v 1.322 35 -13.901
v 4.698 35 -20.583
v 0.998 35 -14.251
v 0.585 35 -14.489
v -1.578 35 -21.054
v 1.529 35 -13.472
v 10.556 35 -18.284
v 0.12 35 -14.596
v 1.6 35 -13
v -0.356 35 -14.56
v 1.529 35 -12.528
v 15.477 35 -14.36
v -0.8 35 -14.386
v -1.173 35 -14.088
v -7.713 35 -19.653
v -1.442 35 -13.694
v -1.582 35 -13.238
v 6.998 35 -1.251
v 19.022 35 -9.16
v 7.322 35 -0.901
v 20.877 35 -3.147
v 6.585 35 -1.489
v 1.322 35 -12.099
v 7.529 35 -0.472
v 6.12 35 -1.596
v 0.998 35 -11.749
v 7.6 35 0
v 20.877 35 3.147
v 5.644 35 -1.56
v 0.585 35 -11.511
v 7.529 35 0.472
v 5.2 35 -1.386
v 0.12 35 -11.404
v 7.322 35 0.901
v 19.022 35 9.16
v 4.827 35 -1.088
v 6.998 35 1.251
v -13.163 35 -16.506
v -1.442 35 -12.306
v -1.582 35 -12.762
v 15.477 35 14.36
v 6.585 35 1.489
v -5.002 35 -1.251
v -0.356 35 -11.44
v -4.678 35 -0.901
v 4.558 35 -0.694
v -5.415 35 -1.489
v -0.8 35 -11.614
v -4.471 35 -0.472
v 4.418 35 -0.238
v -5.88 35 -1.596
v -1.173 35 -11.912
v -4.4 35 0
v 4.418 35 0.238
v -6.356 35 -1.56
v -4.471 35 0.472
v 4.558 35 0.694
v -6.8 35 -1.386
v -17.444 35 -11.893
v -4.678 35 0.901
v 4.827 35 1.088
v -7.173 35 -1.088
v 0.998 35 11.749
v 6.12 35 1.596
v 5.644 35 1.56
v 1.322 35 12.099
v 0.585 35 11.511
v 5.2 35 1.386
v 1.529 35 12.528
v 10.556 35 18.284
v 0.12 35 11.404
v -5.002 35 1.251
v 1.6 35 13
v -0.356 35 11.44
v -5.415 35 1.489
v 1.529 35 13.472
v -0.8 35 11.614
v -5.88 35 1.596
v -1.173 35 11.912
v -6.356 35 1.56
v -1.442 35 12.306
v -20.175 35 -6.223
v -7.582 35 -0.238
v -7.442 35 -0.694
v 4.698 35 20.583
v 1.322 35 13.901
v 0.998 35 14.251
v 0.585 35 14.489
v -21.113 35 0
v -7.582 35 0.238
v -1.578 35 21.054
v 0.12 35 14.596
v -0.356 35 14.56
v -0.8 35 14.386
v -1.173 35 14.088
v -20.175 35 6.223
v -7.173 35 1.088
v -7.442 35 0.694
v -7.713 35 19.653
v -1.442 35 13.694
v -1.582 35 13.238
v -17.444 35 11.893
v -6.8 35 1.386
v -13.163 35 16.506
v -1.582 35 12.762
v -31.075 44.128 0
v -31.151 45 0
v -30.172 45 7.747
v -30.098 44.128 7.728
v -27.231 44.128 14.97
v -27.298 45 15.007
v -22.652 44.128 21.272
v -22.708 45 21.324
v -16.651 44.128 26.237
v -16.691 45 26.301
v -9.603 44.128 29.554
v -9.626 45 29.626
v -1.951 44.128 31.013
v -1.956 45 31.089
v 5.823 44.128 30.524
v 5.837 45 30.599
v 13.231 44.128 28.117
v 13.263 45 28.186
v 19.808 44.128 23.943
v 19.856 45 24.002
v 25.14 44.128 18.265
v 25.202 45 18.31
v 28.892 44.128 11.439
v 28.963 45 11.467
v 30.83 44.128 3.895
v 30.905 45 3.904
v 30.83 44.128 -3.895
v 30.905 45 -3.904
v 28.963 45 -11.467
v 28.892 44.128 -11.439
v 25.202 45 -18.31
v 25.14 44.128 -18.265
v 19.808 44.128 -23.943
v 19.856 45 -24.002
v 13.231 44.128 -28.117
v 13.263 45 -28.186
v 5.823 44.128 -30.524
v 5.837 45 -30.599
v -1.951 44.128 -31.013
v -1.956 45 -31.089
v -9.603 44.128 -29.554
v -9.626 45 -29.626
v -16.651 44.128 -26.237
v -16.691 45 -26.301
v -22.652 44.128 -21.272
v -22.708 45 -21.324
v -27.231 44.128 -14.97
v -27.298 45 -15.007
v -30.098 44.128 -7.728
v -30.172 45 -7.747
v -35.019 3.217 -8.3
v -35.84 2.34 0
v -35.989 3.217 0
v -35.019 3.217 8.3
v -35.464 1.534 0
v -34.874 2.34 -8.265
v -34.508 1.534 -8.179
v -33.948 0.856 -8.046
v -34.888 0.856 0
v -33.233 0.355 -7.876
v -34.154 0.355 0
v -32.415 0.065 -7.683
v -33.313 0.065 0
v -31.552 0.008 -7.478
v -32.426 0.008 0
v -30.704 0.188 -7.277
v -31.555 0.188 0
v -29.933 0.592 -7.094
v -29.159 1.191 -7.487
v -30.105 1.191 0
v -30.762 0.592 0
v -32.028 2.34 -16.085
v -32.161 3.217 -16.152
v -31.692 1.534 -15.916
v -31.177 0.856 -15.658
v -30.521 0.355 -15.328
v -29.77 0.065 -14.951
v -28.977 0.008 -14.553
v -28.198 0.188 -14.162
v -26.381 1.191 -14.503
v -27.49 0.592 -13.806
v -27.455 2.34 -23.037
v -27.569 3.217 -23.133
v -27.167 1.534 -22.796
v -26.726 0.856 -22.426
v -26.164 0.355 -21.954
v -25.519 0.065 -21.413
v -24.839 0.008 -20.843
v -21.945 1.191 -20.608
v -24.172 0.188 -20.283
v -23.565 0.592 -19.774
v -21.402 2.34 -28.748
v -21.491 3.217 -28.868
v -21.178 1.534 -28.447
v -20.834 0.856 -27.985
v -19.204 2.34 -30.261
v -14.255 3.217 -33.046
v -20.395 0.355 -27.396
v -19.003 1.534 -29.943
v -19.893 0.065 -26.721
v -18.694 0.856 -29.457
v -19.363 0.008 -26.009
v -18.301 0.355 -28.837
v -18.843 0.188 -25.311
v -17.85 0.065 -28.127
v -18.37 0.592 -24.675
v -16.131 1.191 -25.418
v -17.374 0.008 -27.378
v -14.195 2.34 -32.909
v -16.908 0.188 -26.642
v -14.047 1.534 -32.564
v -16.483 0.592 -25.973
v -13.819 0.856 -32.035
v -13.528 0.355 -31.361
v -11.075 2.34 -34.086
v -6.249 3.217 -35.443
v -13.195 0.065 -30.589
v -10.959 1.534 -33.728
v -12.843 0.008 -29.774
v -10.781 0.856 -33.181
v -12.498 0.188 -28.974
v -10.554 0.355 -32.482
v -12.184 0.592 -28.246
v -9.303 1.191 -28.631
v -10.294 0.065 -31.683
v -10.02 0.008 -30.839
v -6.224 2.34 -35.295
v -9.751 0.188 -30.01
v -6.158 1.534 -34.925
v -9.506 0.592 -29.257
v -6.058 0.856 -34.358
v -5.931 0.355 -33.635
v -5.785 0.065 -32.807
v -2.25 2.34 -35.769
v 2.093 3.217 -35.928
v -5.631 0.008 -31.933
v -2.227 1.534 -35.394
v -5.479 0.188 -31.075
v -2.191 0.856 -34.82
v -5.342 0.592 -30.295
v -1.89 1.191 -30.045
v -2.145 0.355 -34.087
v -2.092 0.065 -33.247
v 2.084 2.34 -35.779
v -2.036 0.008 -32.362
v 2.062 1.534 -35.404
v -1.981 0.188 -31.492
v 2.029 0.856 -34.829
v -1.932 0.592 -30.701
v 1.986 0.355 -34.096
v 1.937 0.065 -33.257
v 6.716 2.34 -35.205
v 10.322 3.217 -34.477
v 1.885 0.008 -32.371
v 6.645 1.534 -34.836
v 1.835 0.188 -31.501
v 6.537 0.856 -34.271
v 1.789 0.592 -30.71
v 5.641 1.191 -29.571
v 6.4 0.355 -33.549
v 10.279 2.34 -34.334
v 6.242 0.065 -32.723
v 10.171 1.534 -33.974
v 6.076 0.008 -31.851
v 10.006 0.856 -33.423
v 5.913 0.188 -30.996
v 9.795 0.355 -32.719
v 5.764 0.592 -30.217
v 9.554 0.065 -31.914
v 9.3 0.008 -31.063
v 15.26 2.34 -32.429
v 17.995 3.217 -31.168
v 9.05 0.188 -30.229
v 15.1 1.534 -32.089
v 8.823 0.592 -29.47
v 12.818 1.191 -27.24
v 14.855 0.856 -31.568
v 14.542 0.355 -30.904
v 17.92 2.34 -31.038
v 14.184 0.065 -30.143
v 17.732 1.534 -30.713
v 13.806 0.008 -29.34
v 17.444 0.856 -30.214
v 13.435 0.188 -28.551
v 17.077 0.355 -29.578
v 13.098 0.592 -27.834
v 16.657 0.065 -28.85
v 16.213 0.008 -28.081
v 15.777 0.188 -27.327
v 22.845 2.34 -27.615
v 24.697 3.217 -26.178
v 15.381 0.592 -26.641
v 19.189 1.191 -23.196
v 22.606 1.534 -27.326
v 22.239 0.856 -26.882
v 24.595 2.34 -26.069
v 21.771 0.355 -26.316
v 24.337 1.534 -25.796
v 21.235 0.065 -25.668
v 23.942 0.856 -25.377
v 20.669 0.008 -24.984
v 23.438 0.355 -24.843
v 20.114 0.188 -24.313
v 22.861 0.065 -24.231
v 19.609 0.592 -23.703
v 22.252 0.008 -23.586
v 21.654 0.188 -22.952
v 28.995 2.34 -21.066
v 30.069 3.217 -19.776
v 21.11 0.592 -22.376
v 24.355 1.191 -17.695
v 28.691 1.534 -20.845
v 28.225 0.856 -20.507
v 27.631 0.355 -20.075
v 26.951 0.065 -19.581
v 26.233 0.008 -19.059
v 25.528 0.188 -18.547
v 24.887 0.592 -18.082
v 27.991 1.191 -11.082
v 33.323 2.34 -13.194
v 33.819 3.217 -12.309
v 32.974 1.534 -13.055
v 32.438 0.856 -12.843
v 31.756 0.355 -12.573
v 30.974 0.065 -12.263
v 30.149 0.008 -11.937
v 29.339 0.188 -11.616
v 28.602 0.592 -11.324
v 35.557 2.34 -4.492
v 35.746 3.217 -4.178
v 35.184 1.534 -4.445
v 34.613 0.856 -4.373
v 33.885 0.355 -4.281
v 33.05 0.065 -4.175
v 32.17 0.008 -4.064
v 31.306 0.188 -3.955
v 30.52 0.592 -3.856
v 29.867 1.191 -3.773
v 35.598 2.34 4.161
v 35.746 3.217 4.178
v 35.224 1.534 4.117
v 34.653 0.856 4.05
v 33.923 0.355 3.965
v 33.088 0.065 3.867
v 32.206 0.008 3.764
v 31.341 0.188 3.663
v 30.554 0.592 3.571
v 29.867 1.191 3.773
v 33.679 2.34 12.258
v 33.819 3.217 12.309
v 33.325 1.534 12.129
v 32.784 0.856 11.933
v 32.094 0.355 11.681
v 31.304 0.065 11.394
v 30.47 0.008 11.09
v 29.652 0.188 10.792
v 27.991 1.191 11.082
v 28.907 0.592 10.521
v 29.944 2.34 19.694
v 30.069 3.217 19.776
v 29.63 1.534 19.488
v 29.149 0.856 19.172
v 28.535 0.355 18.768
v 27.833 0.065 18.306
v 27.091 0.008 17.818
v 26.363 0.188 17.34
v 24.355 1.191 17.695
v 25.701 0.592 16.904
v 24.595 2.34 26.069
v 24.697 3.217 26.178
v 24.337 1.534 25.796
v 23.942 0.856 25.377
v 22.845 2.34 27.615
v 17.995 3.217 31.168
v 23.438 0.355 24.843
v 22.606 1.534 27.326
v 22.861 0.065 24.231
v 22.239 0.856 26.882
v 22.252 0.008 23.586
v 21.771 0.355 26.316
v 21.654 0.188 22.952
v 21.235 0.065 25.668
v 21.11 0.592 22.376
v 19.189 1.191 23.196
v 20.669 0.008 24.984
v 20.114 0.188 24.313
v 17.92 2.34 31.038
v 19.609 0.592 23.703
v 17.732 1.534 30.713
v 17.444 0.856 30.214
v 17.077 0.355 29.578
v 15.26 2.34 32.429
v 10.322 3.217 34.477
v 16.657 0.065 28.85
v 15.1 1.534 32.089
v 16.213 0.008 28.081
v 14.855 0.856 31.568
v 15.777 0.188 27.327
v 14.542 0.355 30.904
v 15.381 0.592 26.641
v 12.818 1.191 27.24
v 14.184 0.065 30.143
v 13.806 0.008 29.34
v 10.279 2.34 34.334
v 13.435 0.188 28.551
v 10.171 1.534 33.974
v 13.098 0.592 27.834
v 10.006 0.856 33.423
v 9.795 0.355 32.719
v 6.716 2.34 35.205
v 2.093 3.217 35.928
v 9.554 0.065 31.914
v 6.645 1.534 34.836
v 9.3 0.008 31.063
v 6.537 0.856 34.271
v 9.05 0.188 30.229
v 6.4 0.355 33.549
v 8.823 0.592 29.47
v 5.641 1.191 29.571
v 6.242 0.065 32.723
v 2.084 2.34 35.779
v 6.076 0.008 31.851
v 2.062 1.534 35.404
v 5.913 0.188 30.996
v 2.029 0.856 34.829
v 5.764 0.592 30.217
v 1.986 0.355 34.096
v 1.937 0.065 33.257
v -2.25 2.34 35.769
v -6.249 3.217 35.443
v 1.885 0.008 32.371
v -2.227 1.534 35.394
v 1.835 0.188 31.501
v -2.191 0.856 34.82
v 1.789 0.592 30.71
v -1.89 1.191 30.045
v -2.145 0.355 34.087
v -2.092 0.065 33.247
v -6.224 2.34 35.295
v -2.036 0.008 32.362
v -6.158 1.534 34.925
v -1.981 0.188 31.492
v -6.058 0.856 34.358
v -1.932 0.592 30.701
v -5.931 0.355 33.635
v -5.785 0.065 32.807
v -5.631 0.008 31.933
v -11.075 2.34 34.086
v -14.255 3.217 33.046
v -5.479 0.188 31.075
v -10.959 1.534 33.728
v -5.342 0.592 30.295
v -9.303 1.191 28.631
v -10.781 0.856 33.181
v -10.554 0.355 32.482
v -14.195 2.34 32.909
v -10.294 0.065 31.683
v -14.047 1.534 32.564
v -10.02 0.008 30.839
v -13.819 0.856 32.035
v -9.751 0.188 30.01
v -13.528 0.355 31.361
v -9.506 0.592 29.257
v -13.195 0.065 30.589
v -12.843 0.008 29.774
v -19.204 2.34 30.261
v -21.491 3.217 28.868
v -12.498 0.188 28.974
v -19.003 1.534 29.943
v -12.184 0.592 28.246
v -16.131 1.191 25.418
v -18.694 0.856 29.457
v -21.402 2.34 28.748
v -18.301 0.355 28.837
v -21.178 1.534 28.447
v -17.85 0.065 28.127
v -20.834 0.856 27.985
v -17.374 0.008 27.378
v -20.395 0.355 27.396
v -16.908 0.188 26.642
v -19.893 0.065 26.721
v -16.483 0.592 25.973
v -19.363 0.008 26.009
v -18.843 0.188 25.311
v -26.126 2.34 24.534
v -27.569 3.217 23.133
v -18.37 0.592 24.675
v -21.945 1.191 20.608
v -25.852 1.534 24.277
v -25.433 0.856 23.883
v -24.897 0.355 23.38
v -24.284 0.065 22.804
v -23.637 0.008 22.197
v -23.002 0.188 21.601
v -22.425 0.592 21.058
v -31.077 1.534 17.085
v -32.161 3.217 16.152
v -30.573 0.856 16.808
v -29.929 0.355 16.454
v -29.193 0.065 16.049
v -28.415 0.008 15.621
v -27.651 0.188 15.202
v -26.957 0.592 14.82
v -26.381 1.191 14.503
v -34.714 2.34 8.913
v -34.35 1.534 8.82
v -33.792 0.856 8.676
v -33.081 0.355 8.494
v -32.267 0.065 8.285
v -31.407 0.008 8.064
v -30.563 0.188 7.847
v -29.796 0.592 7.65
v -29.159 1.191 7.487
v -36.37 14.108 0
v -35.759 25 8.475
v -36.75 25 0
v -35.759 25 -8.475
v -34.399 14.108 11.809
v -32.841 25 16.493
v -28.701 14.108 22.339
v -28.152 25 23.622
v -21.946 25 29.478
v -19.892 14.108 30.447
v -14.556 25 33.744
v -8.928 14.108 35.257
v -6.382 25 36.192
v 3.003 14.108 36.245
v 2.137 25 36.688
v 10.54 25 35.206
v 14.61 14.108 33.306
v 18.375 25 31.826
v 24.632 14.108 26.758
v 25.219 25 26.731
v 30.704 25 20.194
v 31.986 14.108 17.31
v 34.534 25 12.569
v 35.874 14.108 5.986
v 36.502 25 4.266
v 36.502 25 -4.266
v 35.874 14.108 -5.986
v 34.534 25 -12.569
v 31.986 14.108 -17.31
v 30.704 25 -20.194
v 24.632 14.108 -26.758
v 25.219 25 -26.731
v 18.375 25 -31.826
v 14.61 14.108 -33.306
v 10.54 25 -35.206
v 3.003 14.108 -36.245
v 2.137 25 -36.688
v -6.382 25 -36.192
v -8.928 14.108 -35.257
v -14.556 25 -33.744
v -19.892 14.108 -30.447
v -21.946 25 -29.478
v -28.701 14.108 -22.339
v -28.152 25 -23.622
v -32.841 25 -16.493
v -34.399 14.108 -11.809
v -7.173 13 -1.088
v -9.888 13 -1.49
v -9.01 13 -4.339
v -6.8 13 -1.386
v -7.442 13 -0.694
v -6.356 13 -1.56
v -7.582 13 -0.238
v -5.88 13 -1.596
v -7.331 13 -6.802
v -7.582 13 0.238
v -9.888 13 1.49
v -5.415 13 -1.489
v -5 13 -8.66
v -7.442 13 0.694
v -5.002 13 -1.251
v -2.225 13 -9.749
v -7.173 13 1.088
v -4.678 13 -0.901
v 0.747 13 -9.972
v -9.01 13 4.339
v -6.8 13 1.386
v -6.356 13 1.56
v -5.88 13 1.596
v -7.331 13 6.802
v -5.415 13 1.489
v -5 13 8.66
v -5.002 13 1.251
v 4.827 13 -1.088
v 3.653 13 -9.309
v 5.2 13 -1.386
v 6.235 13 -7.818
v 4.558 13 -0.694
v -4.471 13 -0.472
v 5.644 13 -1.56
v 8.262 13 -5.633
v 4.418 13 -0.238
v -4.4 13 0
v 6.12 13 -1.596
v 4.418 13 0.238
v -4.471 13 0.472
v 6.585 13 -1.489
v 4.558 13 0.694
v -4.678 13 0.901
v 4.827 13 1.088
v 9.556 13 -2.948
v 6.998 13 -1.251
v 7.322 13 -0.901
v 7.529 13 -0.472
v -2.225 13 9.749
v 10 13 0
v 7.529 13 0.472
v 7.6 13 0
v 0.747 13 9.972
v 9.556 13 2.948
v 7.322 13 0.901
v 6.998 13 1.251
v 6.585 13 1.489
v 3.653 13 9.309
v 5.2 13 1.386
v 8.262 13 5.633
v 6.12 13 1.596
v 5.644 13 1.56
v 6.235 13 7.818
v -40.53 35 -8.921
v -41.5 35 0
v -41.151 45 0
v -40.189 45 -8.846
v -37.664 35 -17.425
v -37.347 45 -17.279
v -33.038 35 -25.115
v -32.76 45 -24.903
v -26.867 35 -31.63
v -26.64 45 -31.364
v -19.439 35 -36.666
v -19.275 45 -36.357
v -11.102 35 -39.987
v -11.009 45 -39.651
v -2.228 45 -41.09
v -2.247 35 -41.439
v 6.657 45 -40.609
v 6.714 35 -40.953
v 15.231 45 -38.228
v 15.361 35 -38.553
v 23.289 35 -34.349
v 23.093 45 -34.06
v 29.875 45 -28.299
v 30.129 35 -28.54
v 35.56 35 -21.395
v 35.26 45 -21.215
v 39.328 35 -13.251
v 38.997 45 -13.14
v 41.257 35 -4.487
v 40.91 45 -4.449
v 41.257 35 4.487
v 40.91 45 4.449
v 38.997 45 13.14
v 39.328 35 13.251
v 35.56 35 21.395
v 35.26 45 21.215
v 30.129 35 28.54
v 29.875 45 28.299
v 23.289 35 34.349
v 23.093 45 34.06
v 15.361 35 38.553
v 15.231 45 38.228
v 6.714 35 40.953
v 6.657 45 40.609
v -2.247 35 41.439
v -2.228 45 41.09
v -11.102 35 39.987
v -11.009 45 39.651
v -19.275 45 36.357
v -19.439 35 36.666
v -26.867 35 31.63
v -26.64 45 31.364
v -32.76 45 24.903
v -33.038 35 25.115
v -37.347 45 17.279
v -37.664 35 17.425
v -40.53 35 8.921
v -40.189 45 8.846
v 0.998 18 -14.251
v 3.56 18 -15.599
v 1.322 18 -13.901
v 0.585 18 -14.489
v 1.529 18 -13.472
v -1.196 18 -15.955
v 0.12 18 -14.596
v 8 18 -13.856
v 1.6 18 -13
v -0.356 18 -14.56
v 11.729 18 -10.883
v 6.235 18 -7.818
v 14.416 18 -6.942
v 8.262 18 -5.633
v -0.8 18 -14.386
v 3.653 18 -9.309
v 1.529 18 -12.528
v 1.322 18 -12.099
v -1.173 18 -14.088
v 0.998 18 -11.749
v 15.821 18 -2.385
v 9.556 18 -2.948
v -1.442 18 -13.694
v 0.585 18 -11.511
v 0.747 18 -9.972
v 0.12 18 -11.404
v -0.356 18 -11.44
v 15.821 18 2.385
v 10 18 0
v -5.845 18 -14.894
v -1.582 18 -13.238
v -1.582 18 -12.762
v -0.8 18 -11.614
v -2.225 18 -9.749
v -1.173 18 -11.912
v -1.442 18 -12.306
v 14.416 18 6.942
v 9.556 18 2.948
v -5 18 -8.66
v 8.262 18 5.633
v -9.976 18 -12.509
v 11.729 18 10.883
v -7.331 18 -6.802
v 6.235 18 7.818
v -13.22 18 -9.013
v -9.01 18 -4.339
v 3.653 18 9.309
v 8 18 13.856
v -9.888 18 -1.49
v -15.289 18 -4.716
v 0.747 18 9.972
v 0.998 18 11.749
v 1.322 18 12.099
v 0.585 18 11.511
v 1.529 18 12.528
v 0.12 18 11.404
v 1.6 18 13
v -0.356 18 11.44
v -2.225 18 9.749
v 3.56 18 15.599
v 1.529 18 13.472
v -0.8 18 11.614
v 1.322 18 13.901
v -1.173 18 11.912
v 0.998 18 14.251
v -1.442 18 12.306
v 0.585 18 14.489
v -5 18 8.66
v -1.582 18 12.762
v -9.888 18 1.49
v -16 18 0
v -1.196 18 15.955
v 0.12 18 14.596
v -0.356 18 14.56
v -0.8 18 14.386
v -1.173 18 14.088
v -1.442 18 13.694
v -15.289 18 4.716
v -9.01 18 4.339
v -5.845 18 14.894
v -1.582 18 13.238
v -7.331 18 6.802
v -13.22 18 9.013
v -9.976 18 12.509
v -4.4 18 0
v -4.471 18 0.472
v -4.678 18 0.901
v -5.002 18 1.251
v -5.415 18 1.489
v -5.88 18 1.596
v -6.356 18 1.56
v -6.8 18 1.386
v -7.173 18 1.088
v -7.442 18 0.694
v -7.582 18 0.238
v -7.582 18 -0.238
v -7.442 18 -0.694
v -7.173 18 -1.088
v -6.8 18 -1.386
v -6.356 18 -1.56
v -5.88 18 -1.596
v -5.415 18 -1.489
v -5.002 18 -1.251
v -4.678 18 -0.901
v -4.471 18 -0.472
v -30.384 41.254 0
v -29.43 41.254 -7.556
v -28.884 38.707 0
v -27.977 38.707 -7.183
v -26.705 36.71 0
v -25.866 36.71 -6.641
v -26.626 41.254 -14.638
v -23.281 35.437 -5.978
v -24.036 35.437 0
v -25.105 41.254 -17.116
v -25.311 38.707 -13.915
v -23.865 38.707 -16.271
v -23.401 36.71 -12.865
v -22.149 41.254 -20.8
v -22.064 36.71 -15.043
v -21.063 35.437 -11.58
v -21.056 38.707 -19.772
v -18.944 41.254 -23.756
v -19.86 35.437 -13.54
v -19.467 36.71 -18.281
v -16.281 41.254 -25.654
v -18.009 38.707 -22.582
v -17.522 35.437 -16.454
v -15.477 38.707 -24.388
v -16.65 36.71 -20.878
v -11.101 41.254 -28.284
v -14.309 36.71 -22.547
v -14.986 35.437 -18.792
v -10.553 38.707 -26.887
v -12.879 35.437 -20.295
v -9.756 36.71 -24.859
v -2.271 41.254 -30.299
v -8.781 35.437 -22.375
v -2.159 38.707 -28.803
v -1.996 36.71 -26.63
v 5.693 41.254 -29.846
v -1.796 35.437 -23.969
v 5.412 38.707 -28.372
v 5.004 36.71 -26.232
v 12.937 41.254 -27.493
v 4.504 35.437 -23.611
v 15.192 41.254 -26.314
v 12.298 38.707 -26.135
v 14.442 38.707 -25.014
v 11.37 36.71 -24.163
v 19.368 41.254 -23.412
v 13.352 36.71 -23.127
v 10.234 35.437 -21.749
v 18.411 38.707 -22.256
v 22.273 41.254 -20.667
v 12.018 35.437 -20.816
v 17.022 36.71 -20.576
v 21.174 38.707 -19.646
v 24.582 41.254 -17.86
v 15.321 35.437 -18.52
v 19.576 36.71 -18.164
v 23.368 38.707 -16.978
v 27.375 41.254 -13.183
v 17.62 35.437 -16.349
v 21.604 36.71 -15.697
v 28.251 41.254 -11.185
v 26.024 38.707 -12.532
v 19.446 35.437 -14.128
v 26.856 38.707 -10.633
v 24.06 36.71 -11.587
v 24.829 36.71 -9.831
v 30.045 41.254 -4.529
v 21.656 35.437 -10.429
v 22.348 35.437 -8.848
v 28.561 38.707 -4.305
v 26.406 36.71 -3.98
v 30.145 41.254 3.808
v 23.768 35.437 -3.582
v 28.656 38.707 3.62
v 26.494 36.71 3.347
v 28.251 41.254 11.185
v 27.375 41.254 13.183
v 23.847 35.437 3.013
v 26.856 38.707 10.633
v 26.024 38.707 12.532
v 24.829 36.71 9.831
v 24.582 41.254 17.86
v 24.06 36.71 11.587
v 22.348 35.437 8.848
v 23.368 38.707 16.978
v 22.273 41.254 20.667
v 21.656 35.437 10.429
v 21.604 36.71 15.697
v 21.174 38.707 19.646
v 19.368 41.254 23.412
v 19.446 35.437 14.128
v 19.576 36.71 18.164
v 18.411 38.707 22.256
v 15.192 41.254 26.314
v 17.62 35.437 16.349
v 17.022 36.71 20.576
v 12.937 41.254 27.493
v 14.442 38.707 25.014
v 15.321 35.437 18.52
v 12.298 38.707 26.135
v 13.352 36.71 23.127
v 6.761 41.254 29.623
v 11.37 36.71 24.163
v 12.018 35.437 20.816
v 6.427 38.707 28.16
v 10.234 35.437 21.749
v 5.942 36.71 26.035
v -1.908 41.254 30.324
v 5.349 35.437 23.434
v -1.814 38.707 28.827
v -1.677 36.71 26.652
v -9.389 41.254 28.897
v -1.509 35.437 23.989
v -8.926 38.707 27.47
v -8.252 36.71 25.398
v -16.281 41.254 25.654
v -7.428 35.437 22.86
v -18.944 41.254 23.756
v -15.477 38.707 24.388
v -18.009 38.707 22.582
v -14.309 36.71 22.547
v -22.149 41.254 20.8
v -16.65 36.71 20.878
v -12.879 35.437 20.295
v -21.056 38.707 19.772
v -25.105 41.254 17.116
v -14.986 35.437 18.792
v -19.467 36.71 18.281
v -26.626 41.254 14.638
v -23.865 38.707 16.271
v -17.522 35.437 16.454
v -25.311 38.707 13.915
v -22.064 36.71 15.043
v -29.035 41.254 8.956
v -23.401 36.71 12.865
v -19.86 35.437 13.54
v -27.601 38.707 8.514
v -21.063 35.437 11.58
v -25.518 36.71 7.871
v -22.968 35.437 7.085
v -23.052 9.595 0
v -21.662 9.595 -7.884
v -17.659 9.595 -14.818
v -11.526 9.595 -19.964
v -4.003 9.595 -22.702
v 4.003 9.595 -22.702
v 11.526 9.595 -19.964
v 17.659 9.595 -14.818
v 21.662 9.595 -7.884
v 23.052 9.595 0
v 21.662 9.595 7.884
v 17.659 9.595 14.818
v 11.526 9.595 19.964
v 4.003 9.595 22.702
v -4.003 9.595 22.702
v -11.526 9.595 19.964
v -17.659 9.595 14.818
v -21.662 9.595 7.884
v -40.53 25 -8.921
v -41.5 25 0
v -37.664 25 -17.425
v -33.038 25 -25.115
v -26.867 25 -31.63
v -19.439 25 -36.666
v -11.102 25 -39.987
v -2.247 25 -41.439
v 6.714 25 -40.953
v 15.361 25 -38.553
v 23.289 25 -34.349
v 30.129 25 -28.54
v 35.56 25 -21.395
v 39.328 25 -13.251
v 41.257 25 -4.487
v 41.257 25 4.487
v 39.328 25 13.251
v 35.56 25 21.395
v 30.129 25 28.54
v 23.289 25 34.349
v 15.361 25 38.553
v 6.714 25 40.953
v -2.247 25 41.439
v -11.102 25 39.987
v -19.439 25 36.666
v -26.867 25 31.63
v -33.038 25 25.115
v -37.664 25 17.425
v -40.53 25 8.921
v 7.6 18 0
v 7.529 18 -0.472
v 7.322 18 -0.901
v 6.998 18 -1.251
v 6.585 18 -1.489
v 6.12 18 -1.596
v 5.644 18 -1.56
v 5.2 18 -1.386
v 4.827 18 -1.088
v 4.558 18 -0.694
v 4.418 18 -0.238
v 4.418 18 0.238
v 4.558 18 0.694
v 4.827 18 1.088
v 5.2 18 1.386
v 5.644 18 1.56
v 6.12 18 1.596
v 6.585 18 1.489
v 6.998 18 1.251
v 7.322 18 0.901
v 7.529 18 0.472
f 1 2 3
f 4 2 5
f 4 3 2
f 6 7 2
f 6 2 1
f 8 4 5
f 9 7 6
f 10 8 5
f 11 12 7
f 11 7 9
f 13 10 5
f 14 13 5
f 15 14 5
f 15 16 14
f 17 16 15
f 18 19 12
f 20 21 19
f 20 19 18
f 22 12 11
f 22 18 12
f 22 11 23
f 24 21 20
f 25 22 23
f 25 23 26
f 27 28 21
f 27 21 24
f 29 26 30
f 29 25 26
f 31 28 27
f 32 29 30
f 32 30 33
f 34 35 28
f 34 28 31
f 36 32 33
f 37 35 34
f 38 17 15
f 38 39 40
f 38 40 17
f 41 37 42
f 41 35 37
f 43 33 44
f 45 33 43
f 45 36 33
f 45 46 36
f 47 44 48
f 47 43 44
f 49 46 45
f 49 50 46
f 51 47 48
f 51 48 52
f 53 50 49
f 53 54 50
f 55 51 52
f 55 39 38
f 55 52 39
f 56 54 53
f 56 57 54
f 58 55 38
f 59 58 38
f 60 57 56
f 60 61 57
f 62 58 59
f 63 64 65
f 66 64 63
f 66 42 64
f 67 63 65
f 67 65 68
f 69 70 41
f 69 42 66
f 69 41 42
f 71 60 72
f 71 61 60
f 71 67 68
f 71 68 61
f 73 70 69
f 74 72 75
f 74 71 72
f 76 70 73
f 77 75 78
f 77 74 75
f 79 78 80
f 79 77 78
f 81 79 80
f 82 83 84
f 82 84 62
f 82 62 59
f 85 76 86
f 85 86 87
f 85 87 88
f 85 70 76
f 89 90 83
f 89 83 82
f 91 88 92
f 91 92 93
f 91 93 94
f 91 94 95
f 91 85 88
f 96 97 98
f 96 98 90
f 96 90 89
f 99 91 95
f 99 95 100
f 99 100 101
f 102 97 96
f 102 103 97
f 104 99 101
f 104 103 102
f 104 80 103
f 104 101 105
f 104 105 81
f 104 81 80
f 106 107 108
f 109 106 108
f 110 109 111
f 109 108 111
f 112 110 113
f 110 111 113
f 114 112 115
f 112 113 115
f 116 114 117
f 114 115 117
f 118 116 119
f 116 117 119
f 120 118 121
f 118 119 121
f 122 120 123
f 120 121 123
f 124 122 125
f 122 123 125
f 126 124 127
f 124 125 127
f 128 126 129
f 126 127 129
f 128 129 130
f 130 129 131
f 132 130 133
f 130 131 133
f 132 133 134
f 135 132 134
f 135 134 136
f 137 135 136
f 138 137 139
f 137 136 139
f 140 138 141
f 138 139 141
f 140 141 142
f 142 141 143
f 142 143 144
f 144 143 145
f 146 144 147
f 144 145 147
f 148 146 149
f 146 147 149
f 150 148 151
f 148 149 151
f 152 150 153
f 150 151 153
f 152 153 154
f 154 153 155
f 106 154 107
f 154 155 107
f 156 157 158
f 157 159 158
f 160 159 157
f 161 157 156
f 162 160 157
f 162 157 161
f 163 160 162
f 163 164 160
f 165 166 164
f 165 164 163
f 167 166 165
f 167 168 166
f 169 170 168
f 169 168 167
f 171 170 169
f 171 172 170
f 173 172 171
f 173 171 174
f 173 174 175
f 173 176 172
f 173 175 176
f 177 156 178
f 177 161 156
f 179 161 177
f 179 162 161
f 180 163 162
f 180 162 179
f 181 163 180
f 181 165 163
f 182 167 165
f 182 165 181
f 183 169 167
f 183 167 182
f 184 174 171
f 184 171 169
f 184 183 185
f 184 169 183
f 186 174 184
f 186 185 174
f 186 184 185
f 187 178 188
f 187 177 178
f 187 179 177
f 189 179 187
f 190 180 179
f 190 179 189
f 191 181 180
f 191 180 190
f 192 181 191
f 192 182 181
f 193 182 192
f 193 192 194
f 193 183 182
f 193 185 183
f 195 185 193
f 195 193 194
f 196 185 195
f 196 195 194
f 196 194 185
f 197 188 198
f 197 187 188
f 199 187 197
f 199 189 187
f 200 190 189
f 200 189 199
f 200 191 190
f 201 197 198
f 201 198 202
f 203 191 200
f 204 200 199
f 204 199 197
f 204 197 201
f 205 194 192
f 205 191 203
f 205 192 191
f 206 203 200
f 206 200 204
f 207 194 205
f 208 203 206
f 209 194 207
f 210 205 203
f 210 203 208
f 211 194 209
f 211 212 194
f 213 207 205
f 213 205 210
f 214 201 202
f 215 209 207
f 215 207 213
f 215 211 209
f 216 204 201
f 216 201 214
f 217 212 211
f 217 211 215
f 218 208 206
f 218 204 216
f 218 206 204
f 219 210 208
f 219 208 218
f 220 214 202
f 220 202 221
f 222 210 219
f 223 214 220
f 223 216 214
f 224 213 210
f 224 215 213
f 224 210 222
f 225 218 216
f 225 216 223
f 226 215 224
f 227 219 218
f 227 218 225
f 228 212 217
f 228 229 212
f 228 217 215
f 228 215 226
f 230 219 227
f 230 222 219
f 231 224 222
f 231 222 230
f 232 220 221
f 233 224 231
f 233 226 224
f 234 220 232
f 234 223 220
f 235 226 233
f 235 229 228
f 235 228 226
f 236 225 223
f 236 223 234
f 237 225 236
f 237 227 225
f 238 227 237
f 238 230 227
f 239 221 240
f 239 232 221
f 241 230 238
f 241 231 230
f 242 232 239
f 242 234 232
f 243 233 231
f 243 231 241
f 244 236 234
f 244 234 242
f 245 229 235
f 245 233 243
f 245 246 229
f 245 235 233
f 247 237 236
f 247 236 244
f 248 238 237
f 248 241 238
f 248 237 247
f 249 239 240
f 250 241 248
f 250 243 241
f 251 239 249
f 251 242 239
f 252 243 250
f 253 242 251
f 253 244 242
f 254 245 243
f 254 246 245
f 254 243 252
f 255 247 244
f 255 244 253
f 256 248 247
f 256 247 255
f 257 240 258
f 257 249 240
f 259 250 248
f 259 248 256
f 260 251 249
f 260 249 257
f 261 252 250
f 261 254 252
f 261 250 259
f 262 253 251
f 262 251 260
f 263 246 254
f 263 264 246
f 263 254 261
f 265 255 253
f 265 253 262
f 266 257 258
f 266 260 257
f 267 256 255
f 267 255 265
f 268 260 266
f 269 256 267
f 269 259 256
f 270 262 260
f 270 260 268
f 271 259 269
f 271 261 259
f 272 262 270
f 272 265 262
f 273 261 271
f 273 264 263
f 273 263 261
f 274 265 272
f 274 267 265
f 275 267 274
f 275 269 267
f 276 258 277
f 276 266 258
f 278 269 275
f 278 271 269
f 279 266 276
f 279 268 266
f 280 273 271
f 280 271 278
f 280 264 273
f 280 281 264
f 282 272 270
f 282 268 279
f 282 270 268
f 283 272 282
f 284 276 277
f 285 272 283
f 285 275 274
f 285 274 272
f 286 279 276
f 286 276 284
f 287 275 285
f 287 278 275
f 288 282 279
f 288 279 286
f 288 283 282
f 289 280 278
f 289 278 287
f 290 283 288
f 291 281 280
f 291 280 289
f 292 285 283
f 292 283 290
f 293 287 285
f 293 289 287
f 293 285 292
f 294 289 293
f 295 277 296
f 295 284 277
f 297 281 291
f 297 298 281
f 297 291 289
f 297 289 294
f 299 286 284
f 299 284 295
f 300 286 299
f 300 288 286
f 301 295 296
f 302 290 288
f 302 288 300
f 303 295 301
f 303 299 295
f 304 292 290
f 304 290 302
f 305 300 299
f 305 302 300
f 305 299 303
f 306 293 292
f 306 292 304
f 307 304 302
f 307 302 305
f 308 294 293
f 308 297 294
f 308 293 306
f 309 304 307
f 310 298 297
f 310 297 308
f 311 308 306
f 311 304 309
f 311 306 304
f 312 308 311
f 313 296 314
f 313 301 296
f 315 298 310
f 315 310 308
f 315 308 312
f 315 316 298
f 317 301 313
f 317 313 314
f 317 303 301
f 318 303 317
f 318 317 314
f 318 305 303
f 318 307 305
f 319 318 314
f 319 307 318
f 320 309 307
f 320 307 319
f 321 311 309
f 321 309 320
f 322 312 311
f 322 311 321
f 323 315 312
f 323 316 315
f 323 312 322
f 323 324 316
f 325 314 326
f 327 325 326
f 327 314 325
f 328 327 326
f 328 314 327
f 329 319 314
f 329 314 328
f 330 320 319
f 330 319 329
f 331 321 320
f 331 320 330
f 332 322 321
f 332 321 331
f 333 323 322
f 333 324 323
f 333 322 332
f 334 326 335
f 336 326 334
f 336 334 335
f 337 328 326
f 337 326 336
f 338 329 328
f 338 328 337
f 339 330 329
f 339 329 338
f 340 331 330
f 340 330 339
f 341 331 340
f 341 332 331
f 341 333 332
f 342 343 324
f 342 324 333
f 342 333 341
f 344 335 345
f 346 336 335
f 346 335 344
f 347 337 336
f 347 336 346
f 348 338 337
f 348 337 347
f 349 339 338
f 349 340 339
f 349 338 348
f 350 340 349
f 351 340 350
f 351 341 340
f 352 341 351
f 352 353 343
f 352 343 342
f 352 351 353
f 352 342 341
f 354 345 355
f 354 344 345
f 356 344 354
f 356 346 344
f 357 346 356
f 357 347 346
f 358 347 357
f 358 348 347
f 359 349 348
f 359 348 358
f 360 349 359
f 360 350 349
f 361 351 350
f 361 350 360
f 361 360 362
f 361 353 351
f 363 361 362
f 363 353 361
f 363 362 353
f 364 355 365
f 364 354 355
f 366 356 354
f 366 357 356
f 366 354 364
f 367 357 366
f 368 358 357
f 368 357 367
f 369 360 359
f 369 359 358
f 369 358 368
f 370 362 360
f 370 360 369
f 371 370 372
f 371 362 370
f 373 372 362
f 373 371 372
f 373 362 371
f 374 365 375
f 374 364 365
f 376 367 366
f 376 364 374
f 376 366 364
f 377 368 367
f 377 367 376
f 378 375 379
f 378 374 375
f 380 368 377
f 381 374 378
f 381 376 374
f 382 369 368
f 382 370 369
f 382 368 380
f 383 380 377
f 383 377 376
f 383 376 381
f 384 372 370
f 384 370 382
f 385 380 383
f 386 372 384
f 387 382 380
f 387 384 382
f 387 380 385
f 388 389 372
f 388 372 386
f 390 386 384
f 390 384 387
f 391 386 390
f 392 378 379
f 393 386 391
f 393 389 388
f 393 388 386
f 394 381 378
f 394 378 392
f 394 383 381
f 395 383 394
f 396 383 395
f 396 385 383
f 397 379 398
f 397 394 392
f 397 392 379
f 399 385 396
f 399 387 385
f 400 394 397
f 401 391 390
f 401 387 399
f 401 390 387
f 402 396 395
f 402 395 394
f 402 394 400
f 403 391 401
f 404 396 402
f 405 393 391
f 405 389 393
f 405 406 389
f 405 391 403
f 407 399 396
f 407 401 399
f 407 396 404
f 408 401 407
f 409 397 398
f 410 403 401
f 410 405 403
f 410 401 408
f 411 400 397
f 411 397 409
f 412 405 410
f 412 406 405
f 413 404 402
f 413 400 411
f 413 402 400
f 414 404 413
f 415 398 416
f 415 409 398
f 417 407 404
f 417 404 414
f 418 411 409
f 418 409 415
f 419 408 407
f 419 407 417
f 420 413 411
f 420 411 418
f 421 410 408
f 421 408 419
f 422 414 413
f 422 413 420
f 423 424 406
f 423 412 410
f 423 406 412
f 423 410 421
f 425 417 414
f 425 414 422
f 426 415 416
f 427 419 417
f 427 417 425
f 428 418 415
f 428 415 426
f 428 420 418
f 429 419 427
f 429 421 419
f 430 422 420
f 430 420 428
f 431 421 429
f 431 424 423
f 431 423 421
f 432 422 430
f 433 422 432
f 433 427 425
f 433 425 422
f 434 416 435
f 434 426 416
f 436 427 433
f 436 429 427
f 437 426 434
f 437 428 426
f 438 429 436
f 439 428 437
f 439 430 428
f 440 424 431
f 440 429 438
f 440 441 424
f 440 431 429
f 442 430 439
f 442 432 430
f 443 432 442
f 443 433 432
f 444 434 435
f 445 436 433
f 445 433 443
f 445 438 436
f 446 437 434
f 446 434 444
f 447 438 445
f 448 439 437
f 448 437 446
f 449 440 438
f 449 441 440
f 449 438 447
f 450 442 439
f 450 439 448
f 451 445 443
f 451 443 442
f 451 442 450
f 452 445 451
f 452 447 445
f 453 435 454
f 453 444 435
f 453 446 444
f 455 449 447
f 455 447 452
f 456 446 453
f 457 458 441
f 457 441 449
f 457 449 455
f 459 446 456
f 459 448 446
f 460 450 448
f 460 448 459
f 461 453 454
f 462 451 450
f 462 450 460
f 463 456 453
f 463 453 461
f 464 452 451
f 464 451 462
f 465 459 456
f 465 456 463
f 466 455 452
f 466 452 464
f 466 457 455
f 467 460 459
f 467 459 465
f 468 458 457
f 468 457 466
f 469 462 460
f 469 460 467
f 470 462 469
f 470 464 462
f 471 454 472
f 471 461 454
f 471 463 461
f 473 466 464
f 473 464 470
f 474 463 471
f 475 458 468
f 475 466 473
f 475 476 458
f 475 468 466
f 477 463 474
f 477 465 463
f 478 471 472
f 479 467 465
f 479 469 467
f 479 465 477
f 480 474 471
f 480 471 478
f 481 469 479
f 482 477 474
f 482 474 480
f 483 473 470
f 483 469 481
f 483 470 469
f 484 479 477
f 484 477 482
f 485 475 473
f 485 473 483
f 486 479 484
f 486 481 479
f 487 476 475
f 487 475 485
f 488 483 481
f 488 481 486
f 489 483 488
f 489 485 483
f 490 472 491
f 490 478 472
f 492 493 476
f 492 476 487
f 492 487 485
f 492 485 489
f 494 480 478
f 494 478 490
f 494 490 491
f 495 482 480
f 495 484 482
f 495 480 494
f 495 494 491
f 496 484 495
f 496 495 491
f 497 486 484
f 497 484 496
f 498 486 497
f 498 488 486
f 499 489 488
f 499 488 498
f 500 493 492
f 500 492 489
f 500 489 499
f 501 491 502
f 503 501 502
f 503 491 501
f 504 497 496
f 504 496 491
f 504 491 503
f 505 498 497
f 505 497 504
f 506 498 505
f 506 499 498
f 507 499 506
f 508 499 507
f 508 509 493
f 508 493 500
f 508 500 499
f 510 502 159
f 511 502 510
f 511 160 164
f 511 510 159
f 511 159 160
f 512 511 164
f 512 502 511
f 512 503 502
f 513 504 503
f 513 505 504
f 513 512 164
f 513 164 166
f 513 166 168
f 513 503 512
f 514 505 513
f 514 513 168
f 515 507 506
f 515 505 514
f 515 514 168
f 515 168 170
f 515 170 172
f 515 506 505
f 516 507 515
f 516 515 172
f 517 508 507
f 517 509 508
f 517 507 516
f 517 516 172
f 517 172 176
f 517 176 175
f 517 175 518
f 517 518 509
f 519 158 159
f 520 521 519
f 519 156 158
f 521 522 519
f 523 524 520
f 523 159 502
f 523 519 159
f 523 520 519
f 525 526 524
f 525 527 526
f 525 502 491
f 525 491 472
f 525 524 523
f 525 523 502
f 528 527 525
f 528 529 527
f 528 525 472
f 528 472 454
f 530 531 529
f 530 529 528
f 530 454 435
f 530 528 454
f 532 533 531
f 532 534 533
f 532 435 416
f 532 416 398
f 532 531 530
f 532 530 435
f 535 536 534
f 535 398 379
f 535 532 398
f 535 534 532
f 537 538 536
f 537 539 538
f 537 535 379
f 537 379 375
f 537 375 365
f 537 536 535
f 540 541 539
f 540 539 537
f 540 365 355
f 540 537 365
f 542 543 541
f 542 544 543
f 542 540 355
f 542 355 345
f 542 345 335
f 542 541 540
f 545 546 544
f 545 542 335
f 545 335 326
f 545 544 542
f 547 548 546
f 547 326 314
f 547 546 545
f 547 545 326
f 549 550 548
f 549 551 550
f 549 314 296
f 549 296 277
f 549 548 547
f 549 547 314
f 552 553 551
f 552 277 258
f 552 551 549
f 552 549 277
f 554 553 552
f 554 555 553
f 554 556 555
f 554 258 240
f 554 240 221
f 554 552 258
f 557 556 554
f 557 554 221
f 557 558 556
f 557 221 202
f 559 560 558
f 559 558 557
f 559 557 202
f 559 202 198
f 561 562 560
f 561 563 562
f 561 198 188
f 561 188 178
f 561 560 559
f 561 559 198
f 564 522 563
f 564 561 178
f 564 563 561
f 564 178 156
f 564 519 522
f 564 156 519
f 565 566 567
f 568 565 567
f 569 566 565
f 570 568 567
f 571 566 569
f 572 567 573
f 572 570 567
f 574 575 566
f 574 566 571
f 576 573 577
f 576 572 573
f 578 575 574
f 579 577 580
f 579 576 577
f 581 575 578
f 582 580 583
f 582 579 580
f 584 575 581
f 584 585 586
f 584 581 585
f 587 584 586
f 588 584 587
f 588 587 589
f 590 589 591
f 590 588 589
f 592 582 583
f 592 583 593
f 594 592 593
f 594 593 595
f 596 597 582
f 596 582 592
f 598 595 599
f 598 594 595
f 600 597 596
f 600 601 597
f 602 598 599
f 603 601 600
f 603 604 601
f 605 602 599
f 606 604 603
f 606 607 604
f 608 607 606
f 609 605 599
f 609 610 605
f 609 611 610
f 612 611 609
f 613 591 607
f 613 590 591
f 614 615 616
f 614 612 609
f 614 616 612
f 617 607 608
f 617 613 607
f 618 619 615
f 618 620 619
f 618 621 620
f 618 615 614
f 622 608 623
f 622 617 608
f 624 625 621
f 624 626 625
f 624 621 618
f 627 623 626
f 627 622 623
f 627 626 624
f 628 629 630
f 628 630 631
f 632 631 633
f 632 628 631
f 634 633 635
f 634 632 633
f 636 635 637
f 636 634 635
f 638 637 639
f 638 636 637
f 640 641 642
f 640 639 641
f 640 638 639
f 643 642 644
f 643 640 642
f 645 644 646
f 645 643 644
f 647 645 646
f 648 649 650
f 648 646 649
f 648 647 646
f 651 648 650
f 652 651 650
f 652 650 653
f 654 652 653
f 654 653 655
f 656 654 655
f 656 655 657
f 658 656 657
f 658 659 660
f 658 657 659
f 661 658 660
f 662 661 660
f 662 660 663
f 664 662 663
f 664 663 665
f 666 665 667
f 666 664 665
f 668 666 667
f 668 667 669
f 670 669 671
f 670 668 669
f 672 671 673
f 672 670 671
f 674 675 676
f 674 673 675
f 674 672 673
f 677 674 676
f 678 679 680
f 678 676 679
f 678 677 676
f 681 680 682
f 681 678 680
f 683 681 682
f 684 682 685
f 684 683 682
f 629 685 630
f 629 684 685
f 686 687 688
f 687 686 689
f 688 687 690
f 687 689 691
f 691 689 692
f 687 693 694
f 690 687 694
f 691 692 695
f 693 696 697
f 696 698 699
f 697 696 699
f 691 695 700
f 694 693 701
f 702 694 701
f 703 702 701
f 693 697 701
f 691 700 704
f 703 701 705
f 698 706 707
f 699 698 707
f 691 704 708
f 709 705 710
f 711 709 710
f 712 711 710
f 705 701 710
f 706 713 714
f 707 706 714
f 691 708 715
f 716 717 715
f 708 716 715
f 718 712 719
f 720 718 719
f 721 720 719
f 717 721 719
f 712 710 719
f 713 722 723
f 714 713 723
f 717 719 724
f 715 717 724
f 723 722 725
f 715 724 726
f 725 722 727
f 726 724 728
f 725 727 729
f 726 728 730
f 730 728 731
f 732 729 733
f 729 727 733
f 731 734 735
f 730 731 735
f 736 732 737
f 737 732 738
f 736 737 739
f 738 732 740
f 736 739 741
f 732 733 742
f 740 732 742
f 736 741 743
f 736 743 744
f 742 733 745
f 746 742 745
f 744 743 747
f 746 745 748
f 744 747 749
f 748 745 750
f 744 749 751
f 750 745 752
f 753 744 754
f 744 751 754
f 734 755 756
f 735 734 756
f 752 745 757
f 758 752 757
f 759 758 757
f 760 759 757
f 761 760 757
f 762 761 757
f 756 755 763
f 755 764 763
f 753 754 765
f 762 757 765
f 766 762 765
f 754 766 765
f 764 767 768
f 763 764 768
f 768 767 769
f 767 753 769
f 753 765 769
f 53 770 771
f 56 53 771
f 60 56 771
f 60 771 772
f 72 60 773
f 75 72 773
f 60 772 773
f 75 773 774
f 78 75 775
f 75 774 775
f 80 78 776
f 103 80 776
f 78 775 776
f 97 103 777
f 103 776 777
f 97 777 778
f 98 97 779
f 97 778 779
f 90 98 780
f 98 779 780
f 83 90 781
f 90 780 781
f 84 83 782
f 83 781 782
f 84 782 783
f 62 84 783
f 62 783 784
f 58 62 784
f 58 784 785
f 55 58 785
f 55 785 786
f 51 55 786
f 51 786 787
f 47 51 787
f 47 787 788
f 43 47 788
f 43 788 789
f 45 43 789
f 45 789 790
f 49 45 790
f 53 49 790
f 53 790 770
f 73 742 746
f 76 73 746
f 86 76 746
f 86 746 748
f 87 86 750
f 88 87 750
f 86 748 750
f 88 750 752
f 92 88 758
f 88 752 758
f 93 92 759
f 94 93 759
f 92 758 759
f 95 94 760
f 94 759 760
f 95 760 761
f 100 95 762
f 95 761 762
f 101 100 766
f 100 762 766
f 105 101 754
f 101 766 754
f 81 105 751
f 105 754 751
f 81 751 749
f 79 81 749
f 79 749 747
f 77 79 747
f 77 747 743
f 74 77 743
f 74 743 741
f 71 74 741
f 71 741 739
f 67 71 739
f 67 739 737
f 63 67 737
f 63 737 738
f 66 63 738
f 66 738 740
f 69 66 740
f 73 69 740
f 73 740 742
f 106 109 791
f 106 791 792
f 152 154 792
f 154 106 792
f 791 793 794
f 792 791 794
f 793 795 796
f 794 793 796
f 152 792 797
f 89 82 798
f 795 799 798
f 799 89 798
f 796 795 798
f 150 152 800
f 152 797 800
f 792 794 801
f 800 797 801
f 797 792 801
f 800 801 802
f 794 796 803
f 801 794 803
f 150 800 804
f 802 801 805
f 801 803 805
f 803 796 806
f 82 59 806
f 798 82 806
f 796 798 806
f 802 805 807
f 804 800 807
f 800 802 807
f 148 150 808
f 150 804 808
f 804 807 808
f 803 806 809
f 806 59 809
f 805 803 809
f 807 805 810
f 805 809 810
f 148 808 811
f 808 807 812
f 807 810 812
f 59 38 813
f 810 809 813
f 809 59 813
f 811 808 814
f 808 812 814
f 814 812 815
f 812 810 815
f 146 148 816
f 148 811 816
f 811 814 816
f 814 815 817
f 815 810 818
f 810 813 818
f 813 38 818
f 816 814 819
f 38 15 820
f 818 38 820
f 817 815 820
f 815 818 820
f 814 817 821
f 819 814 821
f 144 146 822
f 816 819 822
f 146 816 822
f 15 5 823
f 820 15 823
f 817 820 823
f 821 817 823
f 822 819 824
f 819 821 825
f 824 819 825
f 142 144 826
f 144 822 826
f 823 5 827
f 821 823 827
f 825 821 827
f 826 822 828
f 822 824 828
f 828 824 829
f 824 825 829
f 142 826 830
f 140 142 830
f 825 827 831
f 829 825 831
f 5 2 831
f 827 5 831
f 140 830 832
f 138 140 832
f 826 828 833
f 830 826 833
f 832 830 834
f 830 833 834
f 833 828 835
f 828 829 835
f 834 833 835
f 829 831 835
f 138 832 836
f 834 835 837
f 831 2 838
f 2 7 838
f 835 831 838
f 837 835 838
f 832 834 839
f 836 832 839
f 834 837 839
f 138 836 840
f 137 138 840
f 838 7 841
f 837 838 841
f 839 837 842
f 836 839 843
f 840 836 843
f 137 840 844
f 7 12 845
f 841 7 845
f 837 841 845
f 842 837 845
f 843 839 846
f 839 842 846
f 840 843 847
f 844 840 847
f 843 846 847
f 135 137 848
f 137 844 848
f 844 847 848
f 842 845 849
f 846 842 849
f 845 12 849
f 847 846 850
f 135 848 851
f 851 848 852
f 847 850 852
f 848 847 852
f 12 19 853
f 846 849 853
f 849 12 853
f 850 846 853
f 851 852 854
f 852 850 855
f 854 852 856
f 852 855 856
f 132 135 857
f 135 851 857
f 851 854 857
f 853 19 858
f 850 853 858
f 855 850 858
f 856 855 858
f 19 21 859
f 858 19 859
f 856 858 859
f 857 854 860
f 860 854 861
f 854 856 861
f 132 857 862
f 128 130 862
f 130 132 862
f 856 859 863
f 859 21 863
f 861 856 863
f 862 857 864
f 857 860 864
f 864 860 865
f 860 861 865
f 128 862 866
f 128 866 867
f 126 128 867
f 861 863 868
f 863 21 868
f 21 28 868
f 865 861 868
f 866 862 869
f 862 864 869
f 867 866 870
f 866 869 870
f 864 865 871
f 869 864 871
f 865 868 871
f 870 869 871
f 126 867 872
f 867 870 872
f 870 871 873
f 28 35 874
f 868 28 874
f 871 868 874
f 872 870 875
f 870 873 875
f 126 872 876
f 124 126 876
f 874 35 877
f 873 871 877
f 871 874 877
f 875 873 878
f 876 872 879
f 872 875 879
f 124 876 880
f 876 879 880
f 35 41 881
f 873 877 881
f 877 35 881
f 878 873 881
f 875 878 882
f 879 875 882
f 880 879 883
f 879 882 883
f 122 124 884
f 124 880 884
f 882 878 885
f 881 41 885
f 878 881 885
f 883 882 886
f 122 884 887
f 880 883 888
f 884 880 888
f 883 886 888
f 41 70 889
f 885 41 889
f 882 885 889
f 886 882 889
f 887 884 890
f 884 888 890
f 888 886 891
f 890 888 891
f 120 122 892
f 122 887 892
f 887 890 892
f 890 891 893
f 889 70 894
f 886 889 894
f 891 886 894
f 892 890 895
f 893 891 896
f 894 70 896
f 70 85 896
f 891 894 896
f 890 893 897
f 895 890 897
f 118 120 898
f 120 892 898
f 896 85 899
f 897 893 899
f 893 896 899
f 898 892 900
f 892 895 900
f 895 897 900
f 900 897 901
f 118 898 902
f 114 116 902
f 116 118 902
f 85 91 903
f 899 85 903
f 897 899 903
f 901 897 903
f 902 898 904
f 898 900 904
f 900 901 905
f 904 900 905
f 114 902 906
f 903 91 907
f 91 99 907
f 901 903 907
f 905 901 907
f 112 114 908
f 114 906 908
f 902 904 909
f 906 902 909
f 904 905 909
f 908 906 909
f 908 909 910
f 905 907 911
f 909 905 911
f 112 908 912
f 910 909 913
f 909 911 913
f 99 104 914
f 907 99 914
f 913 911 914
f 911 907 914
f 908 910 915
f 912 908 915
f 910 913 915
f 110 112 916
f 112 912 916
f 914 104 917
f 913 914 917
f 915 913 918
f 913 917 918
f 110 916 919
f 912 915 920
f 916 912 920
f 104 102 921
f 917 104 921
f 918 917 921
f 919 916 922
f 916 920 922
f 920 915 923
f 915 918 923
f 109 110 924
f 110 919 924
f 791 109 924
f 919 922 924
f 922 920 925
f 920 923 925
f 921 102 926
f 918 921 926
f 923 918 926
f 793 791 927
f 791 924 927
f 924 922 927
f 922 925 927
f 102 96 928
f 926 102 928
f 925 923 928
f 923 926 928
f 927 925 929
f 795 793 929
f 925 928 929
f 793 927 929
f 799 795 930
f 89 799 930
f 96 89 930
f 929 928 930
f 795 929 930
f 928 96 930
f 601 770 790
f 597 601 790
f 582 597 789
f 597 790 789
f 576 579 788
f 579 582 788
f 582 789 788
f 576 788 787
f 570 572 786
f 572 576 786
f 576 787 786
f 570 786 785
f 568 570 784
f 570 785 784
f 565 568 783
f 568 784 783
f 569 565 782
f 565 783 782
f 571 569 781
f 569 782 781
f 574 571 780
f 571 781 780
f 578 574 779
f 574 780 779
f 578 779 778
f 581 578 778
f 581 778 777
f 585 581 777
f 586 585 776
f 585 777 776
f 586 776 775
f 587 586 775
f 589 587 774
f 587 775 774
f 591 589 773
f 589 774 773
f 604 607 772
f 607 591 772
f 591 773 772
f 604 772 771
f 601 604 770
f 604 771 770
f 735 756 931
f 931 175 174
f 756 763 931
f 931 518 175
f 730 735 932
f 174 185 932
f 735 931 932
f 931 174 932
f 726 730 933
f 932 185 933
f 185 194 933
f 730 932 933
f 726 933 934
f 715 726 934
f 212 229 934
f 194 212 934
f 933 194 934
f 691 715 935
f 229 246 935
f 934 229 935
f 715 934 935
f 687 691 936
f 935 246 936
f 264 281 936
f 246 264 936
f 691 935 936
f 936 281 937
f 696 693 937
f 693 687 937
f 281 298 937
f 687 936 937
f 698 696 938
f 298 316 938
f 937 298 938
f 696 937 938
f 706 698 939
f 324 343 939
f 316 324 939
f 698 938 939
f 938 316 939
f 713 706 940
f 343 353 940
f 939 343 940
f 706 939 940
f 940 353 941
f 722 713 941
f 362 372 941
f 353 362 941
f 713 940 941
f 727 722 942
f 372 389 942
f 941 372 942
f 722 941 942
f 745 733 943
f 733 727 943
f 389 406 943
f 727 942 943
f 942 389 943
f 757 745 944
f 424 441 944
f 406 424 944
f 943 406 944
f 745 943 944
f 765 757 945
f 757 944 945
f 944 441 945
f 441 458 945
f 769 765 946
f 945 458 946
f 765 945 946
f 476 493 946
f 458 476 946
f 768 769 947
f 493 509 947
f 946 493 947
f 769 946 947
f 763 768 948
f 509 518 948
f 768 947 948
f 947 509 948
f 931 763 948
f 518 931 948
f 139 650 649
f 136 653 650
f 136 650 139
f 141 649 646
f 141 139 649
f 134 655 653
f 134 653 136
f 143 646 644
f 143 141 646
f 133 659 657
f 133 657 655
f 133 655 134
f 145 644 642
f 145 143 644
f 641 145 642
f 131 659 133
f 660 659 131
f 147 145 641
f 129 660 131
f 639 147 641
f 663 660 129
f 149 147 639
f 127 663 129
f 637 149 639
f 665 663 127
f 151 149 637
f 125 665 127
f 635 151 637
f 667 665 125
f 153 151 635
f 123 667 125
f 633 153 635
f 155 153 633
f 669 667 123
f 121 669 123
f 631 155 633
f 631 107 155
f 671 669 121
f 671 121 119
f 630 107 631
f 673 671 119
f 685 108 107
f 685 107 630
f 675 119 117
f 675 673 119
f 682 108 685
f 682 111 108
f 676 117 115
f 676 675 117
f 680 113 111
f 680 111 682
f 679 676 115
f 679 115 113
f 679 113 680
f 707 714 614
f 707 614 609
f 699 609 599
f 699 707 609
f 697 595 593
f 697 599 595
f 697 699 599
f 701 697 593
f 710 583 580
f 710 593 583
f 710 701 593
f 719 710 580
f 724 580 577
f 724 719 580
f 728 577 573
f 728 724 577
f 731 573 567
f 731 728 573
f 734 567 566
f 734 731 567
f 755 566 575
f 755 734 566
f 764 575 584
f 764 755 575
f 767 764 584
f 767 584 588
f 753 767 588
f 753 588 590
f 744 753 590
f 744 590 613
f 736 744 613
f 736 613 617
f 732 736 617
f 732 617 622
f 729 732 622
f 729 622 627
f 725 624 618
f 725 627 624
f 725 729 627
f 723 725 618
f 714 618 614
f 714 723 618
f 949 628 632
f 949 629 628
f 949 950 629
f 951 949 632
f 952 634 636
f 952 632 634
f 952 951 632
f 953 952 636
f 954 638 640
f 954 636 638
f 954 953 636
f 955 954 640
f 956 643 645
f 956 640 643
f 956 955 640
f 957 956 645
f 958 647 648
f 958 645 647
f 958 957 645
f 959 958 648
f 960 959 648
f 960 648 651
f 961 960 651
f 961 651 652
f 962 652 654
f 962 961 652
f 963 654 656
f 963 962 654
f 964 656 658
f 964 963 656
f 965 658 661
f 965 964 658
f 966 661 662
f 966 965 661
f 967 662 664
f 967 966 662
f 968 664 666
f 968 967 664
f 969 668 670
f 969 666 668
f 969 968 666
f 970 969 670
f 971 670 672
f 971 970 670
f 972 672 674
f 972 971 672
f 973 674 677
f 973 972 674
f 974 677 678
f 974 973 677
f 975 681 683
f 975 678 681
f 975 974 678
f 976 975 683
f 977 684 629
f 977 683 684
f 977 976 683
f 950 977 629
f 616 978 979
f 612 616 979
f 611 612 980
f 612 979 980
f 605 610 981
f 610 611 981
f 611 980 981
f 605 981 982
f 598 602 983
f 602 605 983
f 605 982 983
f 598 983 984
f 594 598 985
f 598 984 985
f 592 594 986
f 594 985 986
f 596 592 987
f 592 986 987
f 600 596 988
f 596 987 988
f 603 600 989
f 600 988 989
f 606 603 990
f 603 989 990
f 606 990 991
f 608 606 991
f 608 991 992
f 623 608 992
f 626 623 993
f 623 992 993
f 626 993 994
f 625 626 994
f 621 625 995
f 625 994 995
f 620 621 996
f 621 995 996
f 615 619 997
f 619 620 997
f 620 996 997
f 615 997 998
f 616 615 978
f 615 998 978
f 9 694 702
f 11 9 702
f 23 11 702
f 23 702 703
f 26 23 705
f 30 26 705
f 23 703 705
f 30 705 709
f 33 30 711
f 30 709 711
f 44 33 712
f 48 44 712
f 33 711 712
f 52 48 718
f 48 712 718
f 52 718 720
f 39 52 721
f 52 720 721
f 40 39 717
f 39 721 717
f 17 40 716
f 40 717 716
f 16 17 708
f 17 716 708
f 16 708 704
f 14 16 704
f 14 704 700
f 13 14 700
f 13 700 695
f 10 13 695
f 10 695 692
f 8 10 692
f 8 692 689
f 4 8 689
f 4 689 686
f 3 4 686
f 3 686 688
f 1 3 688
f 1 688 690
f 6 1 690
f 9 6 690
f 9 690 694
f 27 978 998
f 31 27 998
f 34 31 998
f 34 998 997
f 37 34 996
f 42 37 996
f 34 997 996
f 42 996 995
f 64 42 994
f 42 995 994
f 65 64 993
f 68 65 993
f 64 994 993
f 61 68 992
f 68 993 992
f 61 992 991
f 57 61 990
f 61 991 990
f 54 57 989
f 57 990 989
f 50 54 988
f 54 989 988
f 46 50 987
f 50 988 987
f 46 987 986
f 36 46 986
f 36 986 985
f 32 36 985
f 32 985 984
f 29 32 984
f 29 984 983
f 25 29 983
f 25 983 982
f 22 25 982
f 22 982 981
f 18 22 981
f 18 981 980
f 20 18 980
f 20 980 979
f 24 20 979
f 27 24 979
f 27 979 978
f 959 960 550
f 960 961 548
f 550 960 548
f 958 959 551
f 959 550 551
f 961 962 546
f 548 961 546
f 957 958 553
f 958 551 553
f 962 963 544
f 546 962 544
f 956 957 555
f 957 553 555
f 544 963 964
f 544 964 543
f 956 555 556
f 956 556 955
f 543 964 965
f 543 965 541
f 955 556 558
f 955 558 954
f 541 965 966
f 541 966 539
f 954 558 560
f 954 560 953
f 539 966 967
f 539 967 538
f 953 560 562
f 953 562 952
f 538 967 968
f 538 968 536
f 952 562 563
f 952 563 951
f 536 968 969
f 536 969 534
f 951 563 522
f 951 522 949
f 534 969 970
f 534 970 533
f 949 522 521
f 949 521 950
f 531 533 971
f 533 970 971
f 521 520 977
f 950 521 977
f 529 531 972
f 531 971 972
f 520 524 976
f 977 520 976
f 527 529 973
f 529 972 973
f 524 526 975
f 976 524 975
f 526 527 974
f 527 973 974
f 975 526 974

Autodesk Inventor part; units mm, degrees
ref_plane "YZ Plane" through (0, 0, 0) normal (1, 0, 0) x (0, 1, 0)
ref_plane "XZ Plane" through (0, 0, 0) normal (0, 1, 0) x (-1, 0, 0)
sketch "Sketch1" plane through (0, 0, 0) normal (0, 0, 1) x (1, 0, 0)
  arc A0 (-35.9893, 3.2169) -> (-30.1047, 1.1907) centre (-32.6581, 3.3332) ccw
  line L0 (-30.1047, 1.1907) -> (-16, 18)
  line L1 (-41.5, 35) -> (-41.5, 25)
  line L2 (-41.5, 25) -> (-36.75, 25)
  line L3 (0, 0) -> (0, 35) construction
  line L4 (0, 0) -> (-46.1303, 0) construction
  line L5 (-16, 18) -> (-16, 35)
  line L6 (-16, 35) -> (-41.5, 35)
  line L7 (-16, 18) -> (0, 18)
  line L8 (0, 18) -> (0, 35)
  line L9 (-16, 35) -> (0, 35)
  line L10 (-41.5, 35) -> (-41.1508, 45)
  line L11 (-41.1508, 45) -> (-31.1508, 45)
  line L12 (-31.1508, 45) -> (-30.2759, 35)
  line L13 (-36.75, 25) -> (-35.9893, 3.2169)
  dimension "d0" = 32
  dimension "d2" = 18
  dimension "d4" = 83
  dimension "d20" = 35
  dimension "d21" = 140
  dimension "d22" = 10
  dimension "d44" = 95
  dimension "d45" = 10
  dimension "d46" = 92
  dimension "d48" = 73.5
  dimension "d49" = 92
  dimension "d73" = 45
revolve "Revolution1" add sketch "Sketch1" angle 360 about axis through (0, 0, 0) along (0, 1, 0)
fillet "Fillet1" radius 10 1 edges at (30.2759, 35, 0)
sketch "Sketch3" plane through (0, 18, 0) normal (0, -1, 0) x (1, 0, 0)
  circle A0 centre (-6, 0) radius 1.6
  circle A1 centre (6, 0) radius 1.6
  circle A2 centre (0, 13) radius 1.6
  circle A3 centre (-11.2583, 6.5) radius 1.6
  circle A4 centre (-11.2583, -6.5) radius 1.6
  circle A5 centre (0, -13) radius 1.6
  circle A6 centre (11.2583, -6.5) radius 1.6
  circle A7 centre (11.2583, 6.5) radius 1.6
  point P0 (0, 0)
  dimension "d50" = 3.2
  dimension "d51" = 3.2
  dimension "d52" = 6
  dimension "d53" = 6
  dimension "d54" = 3.2
  dimension "d55" = 13
  dimension "d58" = 360
extrude "Extrusion1" cut sketch "Sketch3" against normal through all contours A0 | A1 | A2 | A5
sketch "Sketch4" plane through (0, 18, 0) normal (0, -1, 0) x (1, 0, 0)
  circle A0 centre (0, 0) radius 10
  circle A1 centre (-6, 0) radius 1.6 projected
  circle A2 centre (6, 0) radius 1.6 projected
  point P0 (0, 0)
  dimension "d62" = 20
extrude "Extrusion2" add sketch "Sketch4" along normal blind 5
ref_plane "Work Plane1" through (0, 30, -41.5) normal (0, 0, 1) x (1, 0, 0)
equation "\"d51\" = d50"
properties part number "020" material "Concrete"
